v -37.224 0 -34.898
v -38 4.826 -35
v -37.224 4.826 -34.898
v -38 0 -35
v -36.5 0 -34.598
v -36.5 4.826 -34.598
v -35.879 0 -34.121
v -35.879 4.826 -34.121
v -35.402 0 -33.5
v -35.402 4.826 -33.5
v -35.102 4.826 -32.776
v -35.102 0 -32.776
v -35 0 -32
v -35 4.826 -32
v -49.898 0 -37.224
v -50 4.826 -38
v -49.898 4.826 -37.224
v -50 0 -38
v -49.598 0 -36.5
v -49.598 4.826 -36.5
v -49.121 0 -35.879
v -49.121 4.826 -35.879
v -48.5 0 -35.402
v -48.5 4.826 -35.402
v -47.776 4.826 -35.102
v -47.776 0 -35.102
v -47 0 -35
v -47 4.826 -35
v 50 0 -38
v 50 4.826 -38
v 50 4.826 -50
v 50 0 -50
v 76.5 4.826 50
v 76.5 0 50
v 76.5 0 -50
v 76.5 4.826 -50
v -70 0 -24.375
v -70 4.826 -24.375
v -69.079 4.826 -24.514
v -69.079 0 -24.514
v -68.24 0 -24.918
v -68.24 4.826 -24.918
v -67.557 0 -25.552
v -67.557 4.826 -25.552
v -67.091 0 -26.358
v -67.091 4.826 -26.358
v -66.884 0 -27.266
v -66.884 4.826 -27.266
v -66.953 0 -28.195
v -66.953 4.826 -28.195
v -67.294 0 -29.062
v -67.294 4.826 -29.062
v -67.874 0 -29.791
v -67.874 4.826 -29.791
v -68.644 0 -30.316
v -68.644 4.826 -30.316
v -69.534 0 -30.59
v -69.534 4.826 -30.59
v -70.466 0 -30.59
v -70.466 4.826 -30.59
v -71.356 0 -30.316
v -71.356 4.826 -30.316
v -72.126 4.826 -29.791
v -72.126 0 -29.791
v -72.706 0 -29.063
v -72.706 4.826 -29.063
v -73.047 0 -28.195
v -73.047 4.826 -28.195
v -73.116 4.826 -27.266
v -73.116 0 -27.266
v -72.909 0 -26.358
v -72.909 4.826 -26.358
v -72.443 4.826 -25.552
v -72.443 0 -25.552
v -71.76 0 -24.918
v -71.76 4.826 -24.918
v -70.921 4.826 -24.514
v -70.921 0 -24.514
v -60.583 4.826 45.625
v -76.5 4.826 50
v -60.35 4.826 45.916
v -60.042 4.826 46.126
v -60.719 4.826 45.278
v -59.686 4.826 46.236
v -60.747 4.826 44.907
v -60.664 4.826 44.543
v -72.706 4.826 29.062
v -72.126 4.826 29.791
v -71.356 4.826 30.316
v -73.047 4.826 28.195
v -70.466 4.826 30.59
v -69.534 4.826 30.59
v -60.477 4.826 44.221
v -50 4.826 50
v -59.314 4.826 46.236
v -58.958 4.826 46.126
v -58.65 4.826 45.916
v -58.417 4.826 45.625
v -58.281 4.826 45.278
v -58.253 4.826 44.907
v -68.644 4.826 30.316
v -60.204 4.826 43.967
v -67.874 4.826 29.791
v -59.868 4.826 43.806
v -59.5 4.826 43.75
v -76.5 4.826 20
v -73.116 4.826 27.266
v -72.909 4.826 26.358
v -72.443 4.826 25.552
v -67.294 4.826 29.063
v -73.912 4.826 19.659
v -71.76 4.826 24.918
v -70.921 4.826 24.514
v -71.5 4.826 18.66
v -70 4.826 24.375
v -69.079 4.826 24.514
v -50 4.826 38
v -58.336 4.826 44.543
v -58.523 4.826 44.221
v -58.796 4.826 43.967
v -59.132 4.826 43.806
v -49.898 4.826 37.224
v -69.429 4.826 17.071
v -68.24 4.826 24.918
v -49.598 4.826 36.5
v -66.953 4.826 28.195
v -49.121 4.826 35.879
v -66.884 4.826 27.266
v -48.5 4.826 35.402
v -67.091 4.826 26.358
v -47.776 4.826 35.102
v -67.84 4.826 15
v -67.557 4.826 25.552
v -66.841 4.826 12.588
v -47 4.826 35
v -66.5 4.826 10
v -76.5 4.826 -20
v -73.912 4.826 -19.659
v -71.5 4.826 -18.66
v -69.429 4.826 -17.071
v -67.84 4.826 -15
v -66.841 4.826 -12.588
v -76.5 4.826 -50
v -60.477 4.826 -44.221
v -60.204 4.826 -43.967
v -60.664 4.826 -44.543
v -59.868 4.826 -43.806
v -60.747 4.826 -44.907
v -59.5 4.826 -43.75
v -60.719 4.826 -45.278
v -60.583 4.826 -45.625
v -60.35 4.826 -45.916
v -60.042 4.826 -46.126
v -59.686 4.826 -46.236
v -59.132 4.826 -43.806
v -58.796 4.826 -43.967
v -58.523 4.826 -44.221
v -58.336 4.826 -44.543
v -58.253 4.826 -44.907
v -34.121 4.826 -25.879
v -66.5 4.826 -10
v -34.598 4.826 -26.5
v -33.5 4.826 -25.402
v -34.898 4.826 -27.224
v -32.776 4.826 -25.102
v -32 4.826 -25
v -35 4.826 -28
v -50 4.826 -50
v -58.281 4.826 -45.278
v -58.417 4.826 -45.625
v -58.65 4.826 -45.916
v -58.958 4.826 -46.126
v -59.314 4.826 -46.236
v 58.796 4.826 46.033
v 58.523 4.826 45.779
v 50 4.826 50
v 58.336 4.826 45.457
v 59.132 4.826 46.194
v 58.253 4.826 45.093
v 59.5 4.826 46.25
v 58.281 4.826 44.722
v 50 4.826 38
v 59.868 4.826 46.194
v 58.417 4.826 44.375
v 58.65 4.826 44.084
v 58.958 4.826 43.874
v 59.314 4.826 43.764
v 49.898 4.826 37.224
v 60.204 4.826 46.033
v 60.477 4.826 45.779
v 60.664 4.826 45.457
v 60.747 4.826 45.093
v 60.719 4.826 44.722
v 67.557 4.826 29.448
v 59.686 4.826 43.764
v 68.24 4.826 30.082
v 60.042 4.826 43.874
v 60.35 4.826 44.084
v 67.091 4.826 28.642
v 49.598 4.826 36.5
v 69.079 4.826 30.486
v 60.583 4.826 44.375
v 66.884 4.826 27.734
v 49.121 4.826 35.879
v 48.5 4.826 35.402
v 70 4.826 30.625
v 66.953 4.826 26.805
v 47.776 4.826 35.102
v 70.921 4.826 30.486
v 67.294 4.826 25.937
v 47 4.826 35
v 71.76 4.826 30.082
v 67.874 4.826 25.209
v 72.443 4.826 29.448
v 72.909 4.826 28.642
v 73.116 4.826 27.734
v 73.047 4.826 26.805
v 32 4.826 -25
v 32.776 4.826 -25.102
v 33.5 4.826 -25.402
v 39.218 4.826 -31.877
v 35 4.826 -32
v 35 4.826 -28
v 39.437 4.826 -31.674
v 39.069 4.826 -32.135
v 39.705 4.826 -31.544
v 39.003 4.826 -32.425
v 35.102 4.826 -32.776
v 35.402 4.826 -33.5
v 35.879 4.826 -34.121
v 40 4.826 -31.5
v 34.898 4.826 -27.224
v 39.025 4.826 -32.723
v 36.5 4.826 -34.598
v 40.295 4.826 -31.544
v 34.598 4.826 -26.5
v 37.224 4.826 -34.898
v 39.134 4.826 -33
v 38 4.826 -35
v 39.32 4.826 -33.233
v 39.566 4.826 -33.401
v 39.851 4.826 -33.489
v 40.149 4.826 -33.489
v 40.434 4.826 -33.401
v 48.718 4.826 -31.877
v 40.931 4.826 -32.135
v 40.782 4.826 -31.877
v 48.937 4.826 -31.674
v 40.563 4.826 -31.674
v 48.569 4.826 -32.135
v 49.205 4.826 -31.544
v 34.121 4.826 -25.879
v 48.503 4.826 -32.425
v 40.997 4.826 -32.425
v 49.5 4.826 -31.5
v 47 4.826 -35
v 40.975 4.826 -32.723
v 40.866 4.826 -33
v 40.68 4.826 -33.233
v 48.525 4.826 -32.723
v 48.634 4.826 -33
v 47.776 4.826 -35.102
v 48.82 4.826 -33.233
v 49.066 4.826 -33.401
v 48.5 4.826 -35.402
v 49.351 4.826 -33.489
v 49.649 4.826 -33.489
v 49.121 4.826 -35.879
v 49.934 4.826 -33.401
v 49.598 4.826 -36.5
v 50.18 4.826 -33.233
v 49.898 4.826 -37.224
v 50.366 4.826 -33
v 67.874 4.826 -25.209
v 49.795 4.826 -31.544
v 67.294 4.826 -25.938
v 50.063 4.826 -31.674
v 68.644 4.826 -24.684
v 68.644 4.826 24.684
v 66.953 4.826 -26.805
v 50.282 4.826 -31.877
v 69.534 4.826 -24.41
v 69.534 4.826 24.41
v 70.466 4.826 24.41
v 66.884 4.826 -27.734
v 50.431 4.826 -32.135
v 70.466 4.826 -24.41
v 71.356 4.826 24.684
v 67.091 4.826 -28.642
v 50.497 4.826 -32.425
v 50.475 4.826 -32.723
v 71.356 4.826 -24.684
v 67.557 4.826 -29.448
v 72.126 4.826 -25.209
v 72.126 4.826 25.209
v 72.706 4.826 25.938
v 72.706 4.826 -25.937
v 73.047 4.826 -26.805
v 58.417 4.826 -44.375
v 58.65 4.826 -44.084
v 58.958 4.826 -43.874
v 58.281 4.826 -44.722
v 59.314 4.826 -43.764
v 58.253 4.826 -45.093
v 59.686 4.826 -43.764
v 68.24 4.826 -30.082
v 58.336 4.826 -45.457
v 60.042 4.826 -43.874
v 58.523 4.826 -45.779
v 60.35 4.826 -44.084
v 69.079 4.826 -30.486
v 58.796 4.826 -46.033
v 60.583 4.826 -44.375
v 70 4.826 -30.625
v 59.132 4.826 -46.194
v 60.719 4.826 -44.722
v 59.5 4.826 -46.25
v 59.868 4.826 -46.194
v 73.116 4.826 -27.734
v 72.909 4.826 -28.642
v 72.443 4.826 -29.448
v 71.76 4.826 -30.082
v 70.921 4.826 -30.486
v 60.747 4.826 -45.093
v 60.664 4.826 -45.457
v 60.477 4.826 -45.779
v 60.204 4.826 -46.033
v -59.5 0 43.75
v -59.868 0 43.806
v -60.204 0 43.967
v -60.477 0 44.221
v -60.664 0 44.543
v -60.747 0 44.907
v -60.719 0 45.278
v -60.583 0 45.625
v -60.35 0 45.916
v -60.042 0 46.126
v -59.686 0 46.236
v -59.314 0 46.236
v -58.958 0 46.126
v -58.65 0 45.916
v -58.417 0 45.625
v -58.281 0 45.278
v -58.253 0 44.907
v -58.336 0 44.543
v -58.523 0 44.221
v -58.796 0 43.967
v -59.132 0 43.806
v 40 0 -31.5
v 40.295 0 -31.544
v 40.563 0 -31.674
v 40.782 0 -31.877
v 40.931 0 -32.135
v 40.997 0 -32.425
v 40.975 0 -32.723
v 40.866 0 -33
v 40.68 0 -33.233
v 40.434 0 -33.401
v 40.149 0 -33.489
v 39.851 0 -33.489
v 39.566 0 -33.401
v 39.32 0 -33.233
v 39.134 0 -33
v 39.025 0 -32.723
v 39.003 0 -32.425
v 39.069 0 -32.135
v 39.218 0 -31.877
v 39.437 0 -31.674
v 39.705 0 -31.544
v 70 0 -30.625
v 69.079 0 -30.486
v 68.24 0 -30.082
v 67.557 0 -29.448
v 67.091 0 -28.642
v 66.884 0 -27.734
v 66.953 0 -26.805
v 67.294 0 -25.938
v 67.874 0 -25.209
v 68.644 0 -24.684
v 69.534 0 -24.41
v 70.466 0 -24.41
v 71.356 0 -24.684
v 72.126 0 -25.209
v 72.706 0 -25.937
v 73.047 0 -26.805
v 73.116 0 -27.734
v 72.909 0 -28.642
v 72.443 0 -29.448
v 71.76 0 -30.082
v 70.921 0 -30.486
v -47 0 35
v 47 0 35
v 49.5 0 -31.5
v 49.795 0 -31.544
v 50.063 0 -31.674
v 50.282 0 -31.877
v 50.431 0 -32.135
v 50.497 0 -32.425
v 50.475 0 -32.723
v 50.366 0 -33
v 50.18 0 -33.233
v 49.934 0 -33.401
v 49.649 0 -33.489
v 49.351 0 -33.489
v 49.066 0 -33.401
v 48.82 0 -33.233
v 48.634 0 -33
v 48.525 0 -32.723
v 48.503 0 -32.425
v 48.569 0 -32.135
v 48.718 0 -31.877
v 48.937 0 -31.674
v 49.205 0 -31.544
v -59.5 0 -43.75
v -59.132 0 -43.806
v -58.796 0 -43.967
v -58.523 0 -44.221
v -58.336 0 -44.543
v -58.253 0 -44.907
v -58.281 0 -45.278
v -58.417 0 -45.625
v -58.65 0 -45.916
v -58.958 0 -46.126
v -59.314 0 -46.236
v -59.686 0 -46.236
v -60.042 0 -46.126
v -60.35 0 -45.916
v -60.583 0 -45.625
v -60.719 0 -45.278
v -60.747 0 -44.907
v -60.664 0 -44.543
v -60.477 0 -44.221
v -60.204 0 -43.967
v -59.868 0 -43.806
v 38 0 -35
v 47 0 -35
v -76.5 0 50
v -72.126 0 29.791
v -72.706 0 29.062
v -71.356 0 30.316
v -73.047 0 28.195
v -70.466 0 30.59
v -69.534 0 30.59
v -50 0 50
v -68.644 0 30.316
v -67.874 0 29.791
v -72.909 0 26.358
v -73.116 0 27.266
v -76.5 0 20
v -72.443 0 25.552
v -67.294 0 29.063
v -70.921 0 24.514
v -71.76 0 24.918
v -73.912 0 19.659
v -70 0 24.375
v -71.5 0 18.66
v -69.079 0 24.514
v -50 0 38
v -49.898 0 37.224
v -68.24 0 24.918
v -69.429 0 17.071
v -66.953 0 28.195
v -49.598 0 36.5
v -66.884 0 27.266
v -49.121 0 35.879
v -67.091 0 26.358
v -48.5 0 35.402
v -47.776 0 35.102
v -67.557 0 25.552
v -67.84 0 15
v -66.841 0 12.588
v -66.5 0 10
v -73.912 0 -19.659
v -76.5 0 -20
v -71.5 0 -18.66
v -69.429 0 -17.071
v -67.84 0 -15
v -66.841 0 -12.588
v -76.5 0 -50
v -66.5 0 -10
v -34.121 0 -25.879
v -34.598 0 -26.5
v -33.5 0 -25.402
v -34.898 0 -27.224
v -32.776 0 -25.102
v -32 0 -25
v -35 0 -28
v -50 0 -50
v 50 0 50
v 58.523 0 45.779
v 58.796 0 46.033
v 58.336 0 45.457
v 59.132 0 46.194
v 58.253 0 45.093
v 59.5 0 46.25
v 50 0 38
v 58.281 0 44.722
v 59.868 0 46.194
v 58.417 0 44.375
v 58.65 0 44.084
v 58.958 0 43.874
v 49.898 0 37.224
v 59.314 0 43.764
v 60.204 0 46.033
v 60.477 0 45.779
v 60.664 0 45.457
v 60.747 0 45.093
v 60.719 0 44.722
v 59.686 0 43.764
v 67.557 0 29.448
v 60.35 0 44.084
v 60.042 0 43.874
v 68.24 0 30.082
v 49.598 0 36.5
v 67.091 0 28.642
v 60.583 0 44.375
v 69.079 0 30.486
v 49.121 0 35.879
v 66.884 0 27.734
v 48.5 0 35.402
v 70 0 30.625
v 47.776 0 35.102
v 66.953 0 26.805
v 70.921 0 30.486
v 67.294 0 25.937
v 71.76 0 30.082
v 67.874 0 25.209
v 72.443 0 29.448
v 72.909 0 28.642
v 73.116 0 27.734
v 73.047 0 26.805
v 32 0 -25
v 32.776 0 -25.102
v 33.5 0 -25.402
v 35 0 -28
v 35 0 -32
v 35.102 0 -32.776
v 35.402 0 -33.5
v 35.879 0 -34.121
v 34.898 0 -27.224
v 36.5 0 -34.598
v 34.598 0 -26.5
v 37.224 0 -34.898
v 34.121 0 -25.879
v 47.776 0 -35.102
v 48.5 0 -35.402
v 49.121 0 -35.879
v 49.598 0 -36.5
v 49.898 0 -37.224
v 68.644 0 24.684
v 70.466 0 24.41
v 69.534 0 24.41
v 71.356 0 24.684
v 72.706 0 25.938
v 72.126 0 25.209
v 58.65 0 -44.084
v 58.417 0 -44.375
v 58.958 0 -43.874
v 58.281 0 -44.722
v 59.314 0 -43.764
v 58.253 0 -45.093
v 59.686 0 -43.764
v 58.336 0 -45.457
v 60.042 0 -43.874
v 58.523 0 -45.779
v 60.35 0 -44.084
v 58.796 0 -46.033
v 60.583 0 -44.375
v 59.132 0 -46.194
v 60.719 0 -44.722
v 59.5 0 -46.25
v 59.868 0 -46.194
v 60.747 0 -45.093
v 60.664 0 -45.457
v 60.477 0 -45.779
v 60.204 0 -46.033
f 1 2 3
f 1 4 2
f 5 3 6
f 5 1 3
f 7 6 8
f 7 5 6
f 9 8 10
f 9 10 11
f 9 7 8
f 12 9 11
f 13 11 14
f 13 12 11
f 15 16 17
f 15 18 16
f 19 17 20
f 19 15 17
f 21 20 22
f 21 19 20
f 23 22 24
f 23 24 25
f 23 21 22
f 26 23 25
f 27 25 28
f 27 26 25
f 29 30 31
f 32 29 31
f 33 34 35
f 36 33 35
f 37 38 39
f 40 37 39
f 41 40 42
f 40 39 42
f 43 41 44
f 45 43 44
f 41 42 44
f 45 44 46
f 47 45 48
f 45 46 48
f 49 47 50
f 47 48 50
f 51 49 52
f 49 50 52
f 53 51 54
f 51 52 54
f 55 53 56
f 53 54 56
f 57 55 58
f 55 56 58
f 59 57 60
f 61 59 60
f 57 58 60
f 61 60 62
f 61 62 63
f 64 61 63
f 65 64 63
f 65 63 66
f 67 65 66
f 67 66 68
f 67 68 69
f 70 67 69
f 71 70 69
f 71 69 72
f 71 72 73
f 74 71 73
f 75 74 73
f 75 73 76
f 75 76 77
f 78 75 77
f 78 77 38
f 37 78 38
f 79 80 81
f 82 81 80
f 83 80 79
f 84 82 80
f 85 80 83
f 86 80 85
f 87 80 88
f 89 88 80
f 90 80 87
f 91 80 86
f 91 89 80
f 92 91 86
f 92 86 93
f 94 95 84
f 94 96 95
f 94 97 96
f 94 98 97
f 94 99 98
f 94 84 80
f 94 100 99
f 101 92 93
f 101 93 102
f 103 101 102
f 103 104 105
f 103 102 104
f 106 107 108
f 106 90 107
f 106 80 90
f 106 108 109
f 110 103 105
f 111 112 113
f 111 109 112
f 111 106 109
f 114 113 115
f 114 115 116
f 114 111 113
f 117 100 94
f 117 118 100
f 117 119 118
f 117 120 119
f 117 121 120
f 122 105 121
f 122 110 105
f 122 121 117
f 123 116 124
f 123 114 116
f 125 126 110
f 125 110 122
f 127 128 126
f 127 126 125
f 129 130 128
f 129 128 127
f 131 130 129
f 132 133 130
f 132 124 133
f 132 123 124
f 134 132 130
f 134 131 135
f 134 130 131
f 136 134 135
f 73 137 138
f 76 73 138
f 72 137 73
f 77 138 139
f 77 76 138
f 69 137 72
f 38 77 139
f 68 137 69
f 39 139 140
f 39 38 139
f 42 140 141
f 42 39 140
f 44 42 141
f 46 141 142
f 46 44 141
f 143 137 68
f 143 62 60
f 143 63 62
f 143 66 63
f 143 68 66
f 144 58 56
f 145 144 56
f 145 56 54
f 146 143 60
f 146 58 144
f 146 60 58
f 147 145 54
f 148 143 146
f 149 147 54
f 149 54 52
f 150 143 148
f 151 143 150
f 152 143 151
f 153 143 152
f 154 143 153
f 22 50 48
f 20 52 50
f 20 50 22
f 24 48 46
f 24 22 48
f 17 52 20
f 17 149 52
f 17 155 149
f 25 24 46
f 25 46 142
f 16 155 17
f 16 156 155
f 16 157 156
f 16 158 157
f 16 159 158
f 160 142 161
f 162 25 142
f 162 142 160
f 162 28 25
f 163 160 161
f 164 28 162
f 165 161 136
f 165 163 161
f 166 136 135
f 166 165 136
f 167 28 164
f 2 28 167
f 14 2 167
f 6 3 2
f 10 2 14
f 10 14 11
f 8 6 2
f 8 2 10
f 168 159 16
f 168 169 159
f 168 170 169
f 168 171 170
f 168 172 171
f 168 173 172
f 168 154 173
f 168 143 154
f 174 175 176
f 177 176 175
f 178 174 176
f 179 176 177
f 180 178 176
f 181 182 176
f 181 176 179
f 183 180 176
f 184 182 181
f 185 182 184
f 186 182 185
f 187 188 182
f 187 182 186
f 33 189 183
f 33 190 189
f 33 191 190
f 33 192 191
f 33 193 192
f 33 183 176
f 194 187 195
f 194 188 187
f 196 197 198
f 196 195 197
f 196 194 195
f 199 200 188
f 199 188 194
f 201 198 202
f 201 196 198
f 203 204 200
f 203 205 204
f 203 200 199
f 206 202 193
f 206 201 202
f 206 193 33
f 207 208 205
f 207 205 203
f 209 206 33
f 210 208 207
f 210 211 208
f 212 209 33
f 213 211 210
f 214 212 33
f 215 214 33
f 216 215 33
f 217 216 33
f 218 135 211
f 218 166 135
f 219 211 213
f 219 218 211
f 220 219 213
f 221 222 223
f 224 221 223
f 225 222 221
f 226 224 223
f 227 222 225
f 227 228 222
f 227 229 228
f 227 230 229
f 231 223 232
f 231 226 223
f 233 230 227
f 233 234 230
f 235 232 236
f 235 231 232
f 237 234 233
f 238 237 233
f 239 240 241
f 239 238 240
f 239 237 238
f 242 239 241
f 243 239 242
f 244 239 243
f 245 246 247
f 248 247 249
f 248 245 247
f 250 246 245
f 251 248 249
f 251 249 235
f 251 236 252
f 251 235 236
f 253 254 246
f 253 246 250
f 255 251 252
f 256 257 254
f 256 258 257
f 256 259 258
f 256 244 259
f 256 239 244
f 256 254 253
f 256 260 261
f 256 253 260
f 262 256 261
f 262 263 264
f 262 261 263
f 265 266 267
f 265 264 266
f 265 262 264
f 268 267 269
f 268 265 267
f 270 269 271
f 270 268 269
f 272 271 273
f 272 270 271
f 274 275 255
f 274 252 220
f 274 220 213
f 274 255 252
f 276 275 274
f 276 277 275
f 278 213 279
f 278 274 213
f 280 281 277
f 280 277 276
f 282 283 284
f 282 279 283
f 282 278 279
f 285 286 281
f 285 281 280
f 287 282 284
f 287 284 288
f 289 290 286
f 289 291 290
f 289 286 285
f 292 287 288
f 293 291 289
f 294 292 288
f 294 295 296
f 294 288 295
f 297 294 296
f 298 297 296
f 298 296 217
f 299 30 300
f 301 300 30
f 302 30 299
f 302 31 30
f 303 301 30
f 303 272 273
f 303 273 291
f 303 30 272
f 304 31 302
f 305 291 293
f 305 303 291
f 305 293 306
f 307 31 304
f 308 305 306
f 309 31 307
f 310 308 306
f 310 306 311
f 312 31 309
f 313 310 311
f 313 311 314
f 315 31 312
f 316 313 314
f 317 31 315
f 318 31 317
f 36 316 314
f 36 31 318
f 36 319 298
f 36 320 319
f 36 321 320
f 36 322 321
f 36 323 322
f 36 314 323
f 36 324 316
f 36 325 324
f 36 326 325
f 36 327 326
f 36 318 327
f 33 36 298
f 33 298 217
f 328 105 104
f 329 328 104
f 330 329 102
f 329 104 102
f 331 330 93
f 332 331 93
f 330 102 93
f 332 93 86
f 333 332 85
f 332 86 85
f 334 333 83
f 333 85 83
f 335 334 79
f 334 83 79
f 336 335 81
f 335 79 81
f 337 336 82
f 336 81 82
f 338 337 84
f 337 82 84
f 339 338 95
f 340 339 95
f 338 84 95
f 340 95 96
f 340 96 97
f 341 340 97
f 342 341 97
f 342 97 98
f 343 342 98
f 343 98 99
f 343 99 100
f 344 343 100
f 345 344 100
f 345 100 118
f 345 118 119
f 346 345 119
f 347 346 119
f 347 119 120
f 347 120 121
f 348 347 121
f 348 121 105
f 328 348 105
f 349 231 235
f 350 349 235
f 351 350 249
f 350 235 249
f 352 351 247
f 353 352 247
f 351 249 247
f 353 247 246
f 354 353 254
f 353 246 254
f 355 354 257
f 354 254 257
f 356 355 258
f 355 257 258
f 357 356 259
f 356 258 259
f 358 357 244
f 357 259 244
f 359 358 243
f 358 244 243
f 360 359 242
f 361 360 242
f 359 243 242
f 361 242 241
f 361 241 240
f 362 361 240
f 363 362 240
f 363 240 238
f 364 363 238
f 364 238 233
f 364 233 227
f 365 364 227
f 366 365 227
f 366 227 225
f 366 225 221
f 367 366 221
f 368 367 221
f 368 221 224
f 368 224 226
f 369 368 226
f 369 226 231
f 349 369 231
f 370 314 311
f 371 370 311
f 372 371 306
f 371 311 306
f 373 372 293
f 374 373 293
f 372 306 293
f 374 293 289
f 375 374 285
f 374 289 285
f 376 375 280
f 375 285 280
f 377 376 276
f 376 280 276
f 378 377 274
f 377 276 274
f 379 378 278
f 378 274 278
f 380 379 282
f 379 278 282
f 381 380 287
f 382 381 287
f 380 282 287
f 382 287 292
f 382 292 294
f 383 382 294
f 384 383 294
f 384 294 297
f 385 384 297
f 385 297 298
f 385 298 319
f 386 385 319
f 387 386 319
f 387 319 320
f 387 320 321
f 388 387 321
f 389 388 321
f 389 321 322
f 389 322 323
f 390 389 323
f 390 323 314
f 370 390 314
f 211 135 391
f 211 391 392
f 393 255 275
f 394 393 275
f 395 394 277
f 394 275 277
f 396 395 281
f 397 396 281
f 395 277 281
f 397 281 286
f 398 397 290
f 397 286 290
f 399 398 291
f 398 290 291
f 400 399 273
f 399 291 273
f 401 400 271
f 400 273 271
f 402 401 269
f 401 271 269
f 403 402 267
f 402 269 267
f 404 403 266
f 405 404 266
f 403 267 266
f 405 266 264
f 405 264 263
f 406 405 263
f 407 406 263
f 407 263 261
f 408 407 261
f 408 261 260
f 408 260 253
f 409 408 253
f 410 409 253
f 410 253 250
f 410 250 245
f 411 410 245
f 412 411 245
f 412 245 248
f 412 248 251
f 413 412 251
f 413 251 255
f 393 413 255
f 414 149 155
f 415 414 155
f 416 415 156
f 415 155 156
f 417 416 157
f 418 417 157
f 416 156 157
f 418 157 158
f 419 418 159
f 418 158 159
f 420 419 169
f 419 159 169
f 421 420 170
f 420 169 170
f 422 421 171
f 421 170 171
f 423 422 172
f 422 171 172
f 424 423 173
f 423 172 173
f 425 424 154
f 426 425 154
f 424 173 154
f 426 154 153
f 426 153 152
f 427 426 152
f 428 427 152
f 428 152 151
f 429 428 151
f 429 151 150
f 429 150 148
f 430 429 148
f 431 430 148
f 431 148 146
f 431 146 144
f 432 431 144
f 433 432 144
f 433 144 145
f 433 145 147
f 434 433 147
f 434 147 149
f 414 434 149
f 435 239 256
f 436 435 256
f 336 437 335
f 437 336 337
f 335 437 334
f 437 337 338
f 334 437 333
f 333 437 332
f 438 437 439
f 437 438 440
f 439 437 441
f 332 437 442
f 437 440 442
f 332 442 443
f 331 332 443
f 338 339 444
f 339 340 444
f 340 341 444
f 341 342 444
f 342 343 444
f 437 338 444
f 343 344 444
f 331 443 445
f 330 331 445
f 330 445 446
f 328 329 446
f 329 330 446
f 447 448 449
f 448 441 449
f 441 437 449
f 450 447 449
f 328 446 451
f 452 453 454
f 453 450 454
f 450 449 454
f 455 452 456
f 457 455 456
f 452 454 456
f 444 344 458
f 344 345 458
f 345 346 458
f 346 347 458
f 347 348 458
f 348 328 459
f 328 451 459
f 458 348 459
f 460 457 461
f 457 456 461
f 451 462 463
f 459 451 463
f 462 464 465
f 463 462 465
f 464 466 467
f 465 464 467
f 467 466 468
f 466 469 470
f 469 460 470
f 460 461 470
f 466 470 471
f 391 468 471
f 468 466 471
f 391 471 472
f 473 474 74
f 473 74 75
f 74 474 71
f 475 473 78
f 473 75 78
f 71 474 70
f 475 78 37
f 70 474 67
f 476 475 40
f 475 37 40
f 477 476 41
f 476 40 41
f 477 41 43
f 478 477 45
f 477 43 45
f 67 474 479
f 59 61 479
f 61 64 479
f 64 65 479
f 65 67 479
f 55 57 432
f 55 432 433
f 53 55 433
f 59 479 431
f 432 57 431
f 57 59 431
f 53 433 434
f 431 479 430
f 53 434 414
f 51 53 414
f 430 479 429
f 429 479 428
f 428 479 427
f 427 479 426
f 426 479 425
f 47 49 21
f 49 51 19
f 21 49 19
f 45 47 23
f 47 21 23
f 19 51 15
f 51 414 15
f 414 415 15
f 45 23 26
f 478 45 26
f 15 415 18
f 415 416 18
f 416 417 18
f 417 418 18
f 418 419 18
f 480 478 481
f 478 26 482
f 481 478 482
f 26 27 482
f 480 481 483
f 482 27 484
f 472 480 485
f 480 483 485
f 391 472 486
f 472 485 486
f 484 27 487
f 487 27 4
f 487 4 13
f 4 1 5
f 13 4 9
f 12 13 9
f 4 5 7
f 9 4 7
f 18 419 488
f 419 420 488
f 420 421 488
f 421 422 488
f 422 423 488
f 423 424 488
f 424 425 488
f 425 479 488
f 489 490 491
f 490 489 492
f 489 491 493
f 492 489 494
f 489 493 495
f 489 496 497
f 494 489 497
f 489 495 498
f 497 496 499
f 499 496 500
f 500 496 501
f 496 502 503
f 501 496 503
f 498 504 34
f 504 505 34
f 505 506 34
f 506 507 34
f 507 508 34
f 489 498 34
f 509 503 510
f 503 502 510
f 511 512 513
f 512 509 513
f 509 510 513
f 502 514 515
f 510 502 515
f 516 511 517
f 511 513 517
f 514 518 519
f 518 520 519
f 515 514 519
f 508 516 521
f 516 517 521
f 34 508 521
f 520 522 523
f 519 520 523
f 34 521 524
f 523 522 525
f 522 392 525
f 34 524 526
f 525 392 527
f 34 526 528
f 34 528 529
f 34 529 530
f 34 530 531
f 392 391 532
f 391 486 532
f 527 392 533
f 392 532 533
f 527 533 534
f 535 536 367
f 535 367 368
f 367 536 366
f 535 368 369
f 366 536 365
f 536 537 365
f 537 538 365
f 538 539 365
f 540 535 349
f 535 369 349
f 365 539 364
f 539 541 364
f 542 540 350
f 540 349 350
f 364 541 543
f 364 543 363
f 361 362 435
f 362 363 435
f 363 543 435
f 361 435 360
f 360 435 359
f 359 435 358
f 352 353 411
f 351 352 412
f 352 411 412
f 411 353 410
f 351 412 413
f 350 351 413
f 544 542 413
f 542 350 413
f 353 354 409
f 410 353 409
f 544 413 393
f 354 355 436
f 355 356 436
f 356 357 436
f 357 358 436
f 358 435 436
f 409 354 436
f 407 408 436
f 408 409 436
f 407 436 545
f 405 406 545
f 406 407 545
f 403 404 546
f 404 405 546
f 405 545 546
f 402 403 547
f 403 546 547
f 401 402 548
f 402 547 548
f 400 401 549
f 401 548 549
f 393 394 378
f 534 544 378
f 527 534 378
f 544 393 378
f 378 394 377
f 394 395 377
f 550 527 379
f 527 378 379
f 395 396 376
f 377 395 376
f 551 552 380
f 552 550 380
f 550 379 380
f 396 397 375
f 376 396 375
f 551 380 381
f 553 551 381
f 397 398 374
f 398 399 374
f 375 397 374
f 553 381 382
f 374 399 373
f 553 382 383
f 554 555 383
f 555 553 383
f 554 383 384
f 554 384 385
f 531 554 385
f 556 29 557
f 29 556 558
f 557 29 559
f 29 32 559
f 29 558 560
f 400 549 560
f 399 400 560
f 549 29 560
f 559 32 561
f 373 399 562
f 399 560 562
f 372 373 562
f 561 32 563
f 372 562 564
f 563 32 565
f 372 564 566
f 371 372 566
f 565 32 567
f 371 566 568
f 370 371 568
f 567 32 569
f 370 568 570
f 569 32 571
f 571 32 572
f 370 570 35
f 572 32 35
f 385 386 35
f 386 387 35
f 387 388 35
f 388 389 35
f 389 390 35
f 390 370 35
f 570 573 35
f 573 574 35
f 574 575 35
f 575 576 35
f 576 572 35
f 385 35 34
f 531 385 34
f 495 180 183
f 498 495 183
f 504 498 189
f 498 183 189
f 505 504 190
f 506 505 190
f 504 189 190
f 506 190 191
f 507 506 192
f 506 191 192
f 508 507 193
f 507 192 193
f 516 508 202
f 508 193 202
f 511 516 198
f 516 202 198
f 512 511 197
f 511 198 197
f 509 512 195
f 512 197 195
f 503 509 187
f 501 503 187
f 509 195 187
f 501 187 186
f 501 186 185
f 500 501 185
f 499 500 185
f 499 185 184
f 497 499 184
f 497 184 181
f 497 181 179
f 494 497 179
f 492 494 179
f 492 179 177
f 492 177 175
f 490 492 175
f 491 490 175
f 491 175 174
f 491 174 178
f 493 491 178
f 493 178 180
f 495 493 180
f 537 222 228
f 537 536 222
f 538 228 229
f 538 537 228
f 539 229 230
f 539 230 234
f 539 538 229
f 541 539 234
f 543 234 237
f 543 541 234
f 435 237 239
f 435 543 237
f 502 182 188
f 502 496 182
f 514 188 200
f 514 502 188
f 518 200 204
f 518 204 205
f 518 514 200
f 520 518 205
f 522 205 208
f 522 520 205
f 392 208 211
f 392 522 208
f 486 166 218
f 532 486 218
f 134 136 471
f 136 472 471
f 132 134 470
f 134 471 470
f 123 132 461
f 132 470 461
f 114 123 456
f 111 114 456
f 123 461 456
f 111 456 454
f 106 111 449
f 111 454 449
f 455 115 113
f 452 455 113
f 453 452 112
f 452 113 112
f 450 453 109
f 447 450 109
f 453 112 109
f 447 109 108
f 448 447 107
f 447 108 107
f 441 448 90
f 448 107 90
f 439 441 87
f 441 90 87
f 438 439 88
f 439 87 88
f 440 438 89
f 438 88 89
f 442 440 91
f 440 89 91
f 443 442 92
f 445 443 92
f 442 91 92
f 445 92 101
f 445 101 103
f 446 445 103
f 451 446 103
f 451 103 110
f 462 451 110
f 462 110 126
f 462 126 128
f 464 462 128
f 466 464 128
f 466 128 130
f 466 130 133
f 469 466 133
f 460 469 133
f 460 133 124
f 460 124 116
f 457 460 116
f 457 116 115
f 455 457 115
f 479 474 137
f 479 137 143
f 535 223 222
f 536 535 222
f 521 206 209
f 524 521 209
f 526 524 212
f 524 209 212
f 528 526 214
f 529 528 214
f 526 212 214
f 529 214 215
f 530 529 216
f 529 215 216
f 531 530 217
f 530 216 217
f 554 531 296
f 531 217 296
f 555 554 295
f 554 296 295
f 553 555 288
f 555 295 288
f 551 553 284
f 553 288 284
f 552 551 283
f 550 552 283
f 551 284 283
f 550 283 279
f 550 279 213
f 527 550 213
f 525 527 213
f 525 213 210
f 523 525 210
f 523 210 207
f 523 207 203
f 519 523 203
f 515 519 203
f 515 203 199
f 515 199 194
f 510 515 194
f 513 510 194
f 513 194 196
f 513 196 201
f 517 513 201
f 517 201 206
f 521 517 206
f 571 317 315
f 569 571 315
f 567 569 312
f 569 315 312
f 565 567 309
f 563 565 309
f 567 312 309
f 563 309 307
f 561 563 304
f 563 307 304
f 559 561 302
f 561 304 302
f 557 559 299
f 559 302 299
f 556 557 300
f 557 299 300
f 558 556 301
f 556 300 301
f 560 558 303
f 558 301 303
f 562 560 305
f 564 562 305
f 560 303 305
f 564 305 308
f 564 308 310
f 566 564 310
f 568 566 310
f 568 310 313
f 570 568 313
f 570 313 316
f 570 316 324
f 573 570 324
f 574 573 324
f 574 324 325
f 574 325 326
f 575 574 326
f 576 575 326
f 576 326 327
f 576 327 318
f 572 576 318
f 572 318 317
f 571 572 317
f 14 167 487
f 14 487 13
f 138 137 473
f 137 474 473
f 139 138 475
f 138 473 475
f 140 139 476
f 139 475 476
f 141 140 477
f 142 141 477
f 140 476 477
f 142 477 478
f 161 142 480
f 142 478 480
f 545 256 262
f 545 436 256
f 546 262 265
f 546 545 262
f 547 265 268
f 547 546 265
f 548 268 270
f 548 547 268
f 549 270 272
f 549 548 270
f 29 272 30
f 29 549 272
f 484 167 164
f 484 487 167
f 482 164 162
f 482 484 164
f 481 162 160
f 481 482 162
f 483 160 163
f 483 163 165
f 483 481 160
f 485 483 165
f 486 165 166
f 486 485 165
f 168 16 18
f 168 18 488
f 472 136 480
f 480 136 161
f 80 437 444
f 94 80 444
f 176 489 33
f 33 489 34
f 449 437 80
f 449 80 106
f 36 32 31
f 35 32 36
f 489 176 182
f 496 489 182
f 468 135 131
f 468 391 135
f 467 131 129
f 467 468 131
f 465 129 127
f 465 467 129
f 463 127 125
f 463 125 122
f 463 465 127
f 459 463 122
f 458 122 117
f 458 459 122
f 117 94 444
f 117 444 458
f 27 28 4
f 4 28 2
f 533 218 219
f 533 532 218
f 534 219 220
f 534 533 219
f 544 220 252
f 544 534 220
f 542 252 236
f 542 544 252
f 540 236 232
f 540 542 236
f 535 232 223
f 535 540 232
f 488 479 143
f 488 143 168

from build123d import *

# Parameters (mm, degrees)
SKETCH1_W           = 153
SKETCH1_H           = 100
BOSS_EXTRUDE1_DEPTH = 4.826
SKETCH2_W           = 100
SKETCH2_H           = 15
CUT_EXTRUDE1_DEPTH  = 92.517977884
SKETCH3_R           = 3.125
SKETCH3_R_2         = 1.25
CUT_EXTRUDE2_DEPTH  = 92.517977884
SKETCH5_W           = 10
SKETCH5_H           = 40
CUT_EXTRUDE3_DEPTH  = 92.517977884
SKETCH6_R           = 1
SKETCH6_W           = 70
SKETCH6_H           = 10
CUT_EXTRUDE4_DEPTH  = 92.517977884
FILLET1_R           = 3
FILLET2_R           = 10


with BuildPart() as part:
    # Sketch1 → Boss-Extrude1 (new body)
    with BuildSketch(Plane(origin=(0, 0, 0), x_dir=(1, 0, 0), z_dir=(0, 1, 0))):
        Rectangle(SKETCH1_W, SKETCH1_H)
    extrude(amount=BOSS_EXTRUDE1_DEPTH)

    # Sketch2 → Cut-Extrude1 (cut, through all)
    with BuildSketch(Plane(origin=(0, 4.826, 0), x_dir=(1, 0, 0), z_dir=(0, 1, 0))):
        with Locations((0, 42.5)):
            Rectangle(SKETCH2_W, SKETCH2_H)
        with Locations((0, -42.5)):
            Rectangle(SKETCH2_W, SKETCH2_H)
    extrude(amount=-CUT_EXTRUDE1_DEPTH, mode=Mode.SUBTRACT)

    # Sketch3 → Cut-Extrude2 (cut, through all)
    with BuildSketch(Plane(origin=(0, 4.826, 0), x_dir=(1, 0, 0), z_dir=(0, 1, 0))):
        with Locations(Location((-70, 27.5, 0), (0, 0, 270))):
            Circle(SKETCH3_R)
        with Locations(Location((-70, -27.5, 0), (0, 0, 90))):
            Circle(SKETCH3_R)
        with Locations(Location((70, -27.5, 0), (0, 0, 270))):
            Circle(SKETCH3_R)
        with Locations(Location((70, 27.5, 0), (0, 0, 90))):
            Circle(SKETCH3_R)
        with Locations(Location((-59.5, 45, 0), (0, 0, 270))):
            Circle(SKETCH3_R_2)
        with Locations(Location((-59.5, -45, 0), (0, 0, 90))):
            Circle(SKETCH3_R_2)
        with Locations(Location((59.5, 45, 0), (0, 0, 90))):
            Circle(SKETCH3_R_2)
        with Locations(Location((59.5, -45, 0), (0, 0, 270))):
            Circle(SKETCH3_R_2)
    extrude(amount=-CUT_EXTRUDE2_DEPTH, mode=Mode.SUBTRACT)

    # Sketch5 → Cut-Extrude3 (cut, through all)
    with BuildSketch(Plane(origin=(0, 4.826, 0), x_dir=(1, 0, 0), z_dir=(0, 1, 0))):
        with Locations((-71.5, 0)):
            Rectangle(SKETCH5_W, SKETCH5_H)
    extrude(amount=-CUT_EXTRUDE3_DEPTH, mode=Mode.SUBTRACT)

    # Sketch6 → Cut-Extrude4 (cut, through all)
    with BuildSketch(Plane(origin=(0, 4.826, 0), x_dir=(1, 0, 0), z_dir=(0, 1, 0))):
        with Locations(Location((40, 32.5, 0), (0, 0, 270))):
            Circle(SKETCH6_R)
        with Locations(Location((49.5, 32.5, 0), (0, 0, 270))):
            Circle(SKETCH6_R)
        with Locations((0, 30)):
            Rectangle(SKETCH6_W, SKETCH6_H)
    extrude(amount=-CUT_EXTRUDE4_DEPTH, mode=Mode.SUBTRACT)

    # Fillet1
    fillet1_edges = [part.edges().sort_by_distance(p)[0] for p in [
        (-35, 2.413, -25),
        (-35, 2.413, -35),
        (35, 2.413, -35),
        (35, 2.413, -25),
        (-50, 2.413, -35),
        (50, 2.413, -35),
        (-50, 2.413, 35),
        (50, 2.413, 35),
    ]]
    fillet(fillet1_edges, radius=FILLET1_R)

    # Fillet2
    fillet2_edges = [part.edges().sort_by_distance(p)[0] for p in [
        (-66.5, 2.413, 20),
        (-66.5, 2.413, -20),
    ]]
    fillet(fillet2_edges, radius=FILLET2_R - 0.0001)  # a hair under: the kernel refuses the full size


solid = part.part
